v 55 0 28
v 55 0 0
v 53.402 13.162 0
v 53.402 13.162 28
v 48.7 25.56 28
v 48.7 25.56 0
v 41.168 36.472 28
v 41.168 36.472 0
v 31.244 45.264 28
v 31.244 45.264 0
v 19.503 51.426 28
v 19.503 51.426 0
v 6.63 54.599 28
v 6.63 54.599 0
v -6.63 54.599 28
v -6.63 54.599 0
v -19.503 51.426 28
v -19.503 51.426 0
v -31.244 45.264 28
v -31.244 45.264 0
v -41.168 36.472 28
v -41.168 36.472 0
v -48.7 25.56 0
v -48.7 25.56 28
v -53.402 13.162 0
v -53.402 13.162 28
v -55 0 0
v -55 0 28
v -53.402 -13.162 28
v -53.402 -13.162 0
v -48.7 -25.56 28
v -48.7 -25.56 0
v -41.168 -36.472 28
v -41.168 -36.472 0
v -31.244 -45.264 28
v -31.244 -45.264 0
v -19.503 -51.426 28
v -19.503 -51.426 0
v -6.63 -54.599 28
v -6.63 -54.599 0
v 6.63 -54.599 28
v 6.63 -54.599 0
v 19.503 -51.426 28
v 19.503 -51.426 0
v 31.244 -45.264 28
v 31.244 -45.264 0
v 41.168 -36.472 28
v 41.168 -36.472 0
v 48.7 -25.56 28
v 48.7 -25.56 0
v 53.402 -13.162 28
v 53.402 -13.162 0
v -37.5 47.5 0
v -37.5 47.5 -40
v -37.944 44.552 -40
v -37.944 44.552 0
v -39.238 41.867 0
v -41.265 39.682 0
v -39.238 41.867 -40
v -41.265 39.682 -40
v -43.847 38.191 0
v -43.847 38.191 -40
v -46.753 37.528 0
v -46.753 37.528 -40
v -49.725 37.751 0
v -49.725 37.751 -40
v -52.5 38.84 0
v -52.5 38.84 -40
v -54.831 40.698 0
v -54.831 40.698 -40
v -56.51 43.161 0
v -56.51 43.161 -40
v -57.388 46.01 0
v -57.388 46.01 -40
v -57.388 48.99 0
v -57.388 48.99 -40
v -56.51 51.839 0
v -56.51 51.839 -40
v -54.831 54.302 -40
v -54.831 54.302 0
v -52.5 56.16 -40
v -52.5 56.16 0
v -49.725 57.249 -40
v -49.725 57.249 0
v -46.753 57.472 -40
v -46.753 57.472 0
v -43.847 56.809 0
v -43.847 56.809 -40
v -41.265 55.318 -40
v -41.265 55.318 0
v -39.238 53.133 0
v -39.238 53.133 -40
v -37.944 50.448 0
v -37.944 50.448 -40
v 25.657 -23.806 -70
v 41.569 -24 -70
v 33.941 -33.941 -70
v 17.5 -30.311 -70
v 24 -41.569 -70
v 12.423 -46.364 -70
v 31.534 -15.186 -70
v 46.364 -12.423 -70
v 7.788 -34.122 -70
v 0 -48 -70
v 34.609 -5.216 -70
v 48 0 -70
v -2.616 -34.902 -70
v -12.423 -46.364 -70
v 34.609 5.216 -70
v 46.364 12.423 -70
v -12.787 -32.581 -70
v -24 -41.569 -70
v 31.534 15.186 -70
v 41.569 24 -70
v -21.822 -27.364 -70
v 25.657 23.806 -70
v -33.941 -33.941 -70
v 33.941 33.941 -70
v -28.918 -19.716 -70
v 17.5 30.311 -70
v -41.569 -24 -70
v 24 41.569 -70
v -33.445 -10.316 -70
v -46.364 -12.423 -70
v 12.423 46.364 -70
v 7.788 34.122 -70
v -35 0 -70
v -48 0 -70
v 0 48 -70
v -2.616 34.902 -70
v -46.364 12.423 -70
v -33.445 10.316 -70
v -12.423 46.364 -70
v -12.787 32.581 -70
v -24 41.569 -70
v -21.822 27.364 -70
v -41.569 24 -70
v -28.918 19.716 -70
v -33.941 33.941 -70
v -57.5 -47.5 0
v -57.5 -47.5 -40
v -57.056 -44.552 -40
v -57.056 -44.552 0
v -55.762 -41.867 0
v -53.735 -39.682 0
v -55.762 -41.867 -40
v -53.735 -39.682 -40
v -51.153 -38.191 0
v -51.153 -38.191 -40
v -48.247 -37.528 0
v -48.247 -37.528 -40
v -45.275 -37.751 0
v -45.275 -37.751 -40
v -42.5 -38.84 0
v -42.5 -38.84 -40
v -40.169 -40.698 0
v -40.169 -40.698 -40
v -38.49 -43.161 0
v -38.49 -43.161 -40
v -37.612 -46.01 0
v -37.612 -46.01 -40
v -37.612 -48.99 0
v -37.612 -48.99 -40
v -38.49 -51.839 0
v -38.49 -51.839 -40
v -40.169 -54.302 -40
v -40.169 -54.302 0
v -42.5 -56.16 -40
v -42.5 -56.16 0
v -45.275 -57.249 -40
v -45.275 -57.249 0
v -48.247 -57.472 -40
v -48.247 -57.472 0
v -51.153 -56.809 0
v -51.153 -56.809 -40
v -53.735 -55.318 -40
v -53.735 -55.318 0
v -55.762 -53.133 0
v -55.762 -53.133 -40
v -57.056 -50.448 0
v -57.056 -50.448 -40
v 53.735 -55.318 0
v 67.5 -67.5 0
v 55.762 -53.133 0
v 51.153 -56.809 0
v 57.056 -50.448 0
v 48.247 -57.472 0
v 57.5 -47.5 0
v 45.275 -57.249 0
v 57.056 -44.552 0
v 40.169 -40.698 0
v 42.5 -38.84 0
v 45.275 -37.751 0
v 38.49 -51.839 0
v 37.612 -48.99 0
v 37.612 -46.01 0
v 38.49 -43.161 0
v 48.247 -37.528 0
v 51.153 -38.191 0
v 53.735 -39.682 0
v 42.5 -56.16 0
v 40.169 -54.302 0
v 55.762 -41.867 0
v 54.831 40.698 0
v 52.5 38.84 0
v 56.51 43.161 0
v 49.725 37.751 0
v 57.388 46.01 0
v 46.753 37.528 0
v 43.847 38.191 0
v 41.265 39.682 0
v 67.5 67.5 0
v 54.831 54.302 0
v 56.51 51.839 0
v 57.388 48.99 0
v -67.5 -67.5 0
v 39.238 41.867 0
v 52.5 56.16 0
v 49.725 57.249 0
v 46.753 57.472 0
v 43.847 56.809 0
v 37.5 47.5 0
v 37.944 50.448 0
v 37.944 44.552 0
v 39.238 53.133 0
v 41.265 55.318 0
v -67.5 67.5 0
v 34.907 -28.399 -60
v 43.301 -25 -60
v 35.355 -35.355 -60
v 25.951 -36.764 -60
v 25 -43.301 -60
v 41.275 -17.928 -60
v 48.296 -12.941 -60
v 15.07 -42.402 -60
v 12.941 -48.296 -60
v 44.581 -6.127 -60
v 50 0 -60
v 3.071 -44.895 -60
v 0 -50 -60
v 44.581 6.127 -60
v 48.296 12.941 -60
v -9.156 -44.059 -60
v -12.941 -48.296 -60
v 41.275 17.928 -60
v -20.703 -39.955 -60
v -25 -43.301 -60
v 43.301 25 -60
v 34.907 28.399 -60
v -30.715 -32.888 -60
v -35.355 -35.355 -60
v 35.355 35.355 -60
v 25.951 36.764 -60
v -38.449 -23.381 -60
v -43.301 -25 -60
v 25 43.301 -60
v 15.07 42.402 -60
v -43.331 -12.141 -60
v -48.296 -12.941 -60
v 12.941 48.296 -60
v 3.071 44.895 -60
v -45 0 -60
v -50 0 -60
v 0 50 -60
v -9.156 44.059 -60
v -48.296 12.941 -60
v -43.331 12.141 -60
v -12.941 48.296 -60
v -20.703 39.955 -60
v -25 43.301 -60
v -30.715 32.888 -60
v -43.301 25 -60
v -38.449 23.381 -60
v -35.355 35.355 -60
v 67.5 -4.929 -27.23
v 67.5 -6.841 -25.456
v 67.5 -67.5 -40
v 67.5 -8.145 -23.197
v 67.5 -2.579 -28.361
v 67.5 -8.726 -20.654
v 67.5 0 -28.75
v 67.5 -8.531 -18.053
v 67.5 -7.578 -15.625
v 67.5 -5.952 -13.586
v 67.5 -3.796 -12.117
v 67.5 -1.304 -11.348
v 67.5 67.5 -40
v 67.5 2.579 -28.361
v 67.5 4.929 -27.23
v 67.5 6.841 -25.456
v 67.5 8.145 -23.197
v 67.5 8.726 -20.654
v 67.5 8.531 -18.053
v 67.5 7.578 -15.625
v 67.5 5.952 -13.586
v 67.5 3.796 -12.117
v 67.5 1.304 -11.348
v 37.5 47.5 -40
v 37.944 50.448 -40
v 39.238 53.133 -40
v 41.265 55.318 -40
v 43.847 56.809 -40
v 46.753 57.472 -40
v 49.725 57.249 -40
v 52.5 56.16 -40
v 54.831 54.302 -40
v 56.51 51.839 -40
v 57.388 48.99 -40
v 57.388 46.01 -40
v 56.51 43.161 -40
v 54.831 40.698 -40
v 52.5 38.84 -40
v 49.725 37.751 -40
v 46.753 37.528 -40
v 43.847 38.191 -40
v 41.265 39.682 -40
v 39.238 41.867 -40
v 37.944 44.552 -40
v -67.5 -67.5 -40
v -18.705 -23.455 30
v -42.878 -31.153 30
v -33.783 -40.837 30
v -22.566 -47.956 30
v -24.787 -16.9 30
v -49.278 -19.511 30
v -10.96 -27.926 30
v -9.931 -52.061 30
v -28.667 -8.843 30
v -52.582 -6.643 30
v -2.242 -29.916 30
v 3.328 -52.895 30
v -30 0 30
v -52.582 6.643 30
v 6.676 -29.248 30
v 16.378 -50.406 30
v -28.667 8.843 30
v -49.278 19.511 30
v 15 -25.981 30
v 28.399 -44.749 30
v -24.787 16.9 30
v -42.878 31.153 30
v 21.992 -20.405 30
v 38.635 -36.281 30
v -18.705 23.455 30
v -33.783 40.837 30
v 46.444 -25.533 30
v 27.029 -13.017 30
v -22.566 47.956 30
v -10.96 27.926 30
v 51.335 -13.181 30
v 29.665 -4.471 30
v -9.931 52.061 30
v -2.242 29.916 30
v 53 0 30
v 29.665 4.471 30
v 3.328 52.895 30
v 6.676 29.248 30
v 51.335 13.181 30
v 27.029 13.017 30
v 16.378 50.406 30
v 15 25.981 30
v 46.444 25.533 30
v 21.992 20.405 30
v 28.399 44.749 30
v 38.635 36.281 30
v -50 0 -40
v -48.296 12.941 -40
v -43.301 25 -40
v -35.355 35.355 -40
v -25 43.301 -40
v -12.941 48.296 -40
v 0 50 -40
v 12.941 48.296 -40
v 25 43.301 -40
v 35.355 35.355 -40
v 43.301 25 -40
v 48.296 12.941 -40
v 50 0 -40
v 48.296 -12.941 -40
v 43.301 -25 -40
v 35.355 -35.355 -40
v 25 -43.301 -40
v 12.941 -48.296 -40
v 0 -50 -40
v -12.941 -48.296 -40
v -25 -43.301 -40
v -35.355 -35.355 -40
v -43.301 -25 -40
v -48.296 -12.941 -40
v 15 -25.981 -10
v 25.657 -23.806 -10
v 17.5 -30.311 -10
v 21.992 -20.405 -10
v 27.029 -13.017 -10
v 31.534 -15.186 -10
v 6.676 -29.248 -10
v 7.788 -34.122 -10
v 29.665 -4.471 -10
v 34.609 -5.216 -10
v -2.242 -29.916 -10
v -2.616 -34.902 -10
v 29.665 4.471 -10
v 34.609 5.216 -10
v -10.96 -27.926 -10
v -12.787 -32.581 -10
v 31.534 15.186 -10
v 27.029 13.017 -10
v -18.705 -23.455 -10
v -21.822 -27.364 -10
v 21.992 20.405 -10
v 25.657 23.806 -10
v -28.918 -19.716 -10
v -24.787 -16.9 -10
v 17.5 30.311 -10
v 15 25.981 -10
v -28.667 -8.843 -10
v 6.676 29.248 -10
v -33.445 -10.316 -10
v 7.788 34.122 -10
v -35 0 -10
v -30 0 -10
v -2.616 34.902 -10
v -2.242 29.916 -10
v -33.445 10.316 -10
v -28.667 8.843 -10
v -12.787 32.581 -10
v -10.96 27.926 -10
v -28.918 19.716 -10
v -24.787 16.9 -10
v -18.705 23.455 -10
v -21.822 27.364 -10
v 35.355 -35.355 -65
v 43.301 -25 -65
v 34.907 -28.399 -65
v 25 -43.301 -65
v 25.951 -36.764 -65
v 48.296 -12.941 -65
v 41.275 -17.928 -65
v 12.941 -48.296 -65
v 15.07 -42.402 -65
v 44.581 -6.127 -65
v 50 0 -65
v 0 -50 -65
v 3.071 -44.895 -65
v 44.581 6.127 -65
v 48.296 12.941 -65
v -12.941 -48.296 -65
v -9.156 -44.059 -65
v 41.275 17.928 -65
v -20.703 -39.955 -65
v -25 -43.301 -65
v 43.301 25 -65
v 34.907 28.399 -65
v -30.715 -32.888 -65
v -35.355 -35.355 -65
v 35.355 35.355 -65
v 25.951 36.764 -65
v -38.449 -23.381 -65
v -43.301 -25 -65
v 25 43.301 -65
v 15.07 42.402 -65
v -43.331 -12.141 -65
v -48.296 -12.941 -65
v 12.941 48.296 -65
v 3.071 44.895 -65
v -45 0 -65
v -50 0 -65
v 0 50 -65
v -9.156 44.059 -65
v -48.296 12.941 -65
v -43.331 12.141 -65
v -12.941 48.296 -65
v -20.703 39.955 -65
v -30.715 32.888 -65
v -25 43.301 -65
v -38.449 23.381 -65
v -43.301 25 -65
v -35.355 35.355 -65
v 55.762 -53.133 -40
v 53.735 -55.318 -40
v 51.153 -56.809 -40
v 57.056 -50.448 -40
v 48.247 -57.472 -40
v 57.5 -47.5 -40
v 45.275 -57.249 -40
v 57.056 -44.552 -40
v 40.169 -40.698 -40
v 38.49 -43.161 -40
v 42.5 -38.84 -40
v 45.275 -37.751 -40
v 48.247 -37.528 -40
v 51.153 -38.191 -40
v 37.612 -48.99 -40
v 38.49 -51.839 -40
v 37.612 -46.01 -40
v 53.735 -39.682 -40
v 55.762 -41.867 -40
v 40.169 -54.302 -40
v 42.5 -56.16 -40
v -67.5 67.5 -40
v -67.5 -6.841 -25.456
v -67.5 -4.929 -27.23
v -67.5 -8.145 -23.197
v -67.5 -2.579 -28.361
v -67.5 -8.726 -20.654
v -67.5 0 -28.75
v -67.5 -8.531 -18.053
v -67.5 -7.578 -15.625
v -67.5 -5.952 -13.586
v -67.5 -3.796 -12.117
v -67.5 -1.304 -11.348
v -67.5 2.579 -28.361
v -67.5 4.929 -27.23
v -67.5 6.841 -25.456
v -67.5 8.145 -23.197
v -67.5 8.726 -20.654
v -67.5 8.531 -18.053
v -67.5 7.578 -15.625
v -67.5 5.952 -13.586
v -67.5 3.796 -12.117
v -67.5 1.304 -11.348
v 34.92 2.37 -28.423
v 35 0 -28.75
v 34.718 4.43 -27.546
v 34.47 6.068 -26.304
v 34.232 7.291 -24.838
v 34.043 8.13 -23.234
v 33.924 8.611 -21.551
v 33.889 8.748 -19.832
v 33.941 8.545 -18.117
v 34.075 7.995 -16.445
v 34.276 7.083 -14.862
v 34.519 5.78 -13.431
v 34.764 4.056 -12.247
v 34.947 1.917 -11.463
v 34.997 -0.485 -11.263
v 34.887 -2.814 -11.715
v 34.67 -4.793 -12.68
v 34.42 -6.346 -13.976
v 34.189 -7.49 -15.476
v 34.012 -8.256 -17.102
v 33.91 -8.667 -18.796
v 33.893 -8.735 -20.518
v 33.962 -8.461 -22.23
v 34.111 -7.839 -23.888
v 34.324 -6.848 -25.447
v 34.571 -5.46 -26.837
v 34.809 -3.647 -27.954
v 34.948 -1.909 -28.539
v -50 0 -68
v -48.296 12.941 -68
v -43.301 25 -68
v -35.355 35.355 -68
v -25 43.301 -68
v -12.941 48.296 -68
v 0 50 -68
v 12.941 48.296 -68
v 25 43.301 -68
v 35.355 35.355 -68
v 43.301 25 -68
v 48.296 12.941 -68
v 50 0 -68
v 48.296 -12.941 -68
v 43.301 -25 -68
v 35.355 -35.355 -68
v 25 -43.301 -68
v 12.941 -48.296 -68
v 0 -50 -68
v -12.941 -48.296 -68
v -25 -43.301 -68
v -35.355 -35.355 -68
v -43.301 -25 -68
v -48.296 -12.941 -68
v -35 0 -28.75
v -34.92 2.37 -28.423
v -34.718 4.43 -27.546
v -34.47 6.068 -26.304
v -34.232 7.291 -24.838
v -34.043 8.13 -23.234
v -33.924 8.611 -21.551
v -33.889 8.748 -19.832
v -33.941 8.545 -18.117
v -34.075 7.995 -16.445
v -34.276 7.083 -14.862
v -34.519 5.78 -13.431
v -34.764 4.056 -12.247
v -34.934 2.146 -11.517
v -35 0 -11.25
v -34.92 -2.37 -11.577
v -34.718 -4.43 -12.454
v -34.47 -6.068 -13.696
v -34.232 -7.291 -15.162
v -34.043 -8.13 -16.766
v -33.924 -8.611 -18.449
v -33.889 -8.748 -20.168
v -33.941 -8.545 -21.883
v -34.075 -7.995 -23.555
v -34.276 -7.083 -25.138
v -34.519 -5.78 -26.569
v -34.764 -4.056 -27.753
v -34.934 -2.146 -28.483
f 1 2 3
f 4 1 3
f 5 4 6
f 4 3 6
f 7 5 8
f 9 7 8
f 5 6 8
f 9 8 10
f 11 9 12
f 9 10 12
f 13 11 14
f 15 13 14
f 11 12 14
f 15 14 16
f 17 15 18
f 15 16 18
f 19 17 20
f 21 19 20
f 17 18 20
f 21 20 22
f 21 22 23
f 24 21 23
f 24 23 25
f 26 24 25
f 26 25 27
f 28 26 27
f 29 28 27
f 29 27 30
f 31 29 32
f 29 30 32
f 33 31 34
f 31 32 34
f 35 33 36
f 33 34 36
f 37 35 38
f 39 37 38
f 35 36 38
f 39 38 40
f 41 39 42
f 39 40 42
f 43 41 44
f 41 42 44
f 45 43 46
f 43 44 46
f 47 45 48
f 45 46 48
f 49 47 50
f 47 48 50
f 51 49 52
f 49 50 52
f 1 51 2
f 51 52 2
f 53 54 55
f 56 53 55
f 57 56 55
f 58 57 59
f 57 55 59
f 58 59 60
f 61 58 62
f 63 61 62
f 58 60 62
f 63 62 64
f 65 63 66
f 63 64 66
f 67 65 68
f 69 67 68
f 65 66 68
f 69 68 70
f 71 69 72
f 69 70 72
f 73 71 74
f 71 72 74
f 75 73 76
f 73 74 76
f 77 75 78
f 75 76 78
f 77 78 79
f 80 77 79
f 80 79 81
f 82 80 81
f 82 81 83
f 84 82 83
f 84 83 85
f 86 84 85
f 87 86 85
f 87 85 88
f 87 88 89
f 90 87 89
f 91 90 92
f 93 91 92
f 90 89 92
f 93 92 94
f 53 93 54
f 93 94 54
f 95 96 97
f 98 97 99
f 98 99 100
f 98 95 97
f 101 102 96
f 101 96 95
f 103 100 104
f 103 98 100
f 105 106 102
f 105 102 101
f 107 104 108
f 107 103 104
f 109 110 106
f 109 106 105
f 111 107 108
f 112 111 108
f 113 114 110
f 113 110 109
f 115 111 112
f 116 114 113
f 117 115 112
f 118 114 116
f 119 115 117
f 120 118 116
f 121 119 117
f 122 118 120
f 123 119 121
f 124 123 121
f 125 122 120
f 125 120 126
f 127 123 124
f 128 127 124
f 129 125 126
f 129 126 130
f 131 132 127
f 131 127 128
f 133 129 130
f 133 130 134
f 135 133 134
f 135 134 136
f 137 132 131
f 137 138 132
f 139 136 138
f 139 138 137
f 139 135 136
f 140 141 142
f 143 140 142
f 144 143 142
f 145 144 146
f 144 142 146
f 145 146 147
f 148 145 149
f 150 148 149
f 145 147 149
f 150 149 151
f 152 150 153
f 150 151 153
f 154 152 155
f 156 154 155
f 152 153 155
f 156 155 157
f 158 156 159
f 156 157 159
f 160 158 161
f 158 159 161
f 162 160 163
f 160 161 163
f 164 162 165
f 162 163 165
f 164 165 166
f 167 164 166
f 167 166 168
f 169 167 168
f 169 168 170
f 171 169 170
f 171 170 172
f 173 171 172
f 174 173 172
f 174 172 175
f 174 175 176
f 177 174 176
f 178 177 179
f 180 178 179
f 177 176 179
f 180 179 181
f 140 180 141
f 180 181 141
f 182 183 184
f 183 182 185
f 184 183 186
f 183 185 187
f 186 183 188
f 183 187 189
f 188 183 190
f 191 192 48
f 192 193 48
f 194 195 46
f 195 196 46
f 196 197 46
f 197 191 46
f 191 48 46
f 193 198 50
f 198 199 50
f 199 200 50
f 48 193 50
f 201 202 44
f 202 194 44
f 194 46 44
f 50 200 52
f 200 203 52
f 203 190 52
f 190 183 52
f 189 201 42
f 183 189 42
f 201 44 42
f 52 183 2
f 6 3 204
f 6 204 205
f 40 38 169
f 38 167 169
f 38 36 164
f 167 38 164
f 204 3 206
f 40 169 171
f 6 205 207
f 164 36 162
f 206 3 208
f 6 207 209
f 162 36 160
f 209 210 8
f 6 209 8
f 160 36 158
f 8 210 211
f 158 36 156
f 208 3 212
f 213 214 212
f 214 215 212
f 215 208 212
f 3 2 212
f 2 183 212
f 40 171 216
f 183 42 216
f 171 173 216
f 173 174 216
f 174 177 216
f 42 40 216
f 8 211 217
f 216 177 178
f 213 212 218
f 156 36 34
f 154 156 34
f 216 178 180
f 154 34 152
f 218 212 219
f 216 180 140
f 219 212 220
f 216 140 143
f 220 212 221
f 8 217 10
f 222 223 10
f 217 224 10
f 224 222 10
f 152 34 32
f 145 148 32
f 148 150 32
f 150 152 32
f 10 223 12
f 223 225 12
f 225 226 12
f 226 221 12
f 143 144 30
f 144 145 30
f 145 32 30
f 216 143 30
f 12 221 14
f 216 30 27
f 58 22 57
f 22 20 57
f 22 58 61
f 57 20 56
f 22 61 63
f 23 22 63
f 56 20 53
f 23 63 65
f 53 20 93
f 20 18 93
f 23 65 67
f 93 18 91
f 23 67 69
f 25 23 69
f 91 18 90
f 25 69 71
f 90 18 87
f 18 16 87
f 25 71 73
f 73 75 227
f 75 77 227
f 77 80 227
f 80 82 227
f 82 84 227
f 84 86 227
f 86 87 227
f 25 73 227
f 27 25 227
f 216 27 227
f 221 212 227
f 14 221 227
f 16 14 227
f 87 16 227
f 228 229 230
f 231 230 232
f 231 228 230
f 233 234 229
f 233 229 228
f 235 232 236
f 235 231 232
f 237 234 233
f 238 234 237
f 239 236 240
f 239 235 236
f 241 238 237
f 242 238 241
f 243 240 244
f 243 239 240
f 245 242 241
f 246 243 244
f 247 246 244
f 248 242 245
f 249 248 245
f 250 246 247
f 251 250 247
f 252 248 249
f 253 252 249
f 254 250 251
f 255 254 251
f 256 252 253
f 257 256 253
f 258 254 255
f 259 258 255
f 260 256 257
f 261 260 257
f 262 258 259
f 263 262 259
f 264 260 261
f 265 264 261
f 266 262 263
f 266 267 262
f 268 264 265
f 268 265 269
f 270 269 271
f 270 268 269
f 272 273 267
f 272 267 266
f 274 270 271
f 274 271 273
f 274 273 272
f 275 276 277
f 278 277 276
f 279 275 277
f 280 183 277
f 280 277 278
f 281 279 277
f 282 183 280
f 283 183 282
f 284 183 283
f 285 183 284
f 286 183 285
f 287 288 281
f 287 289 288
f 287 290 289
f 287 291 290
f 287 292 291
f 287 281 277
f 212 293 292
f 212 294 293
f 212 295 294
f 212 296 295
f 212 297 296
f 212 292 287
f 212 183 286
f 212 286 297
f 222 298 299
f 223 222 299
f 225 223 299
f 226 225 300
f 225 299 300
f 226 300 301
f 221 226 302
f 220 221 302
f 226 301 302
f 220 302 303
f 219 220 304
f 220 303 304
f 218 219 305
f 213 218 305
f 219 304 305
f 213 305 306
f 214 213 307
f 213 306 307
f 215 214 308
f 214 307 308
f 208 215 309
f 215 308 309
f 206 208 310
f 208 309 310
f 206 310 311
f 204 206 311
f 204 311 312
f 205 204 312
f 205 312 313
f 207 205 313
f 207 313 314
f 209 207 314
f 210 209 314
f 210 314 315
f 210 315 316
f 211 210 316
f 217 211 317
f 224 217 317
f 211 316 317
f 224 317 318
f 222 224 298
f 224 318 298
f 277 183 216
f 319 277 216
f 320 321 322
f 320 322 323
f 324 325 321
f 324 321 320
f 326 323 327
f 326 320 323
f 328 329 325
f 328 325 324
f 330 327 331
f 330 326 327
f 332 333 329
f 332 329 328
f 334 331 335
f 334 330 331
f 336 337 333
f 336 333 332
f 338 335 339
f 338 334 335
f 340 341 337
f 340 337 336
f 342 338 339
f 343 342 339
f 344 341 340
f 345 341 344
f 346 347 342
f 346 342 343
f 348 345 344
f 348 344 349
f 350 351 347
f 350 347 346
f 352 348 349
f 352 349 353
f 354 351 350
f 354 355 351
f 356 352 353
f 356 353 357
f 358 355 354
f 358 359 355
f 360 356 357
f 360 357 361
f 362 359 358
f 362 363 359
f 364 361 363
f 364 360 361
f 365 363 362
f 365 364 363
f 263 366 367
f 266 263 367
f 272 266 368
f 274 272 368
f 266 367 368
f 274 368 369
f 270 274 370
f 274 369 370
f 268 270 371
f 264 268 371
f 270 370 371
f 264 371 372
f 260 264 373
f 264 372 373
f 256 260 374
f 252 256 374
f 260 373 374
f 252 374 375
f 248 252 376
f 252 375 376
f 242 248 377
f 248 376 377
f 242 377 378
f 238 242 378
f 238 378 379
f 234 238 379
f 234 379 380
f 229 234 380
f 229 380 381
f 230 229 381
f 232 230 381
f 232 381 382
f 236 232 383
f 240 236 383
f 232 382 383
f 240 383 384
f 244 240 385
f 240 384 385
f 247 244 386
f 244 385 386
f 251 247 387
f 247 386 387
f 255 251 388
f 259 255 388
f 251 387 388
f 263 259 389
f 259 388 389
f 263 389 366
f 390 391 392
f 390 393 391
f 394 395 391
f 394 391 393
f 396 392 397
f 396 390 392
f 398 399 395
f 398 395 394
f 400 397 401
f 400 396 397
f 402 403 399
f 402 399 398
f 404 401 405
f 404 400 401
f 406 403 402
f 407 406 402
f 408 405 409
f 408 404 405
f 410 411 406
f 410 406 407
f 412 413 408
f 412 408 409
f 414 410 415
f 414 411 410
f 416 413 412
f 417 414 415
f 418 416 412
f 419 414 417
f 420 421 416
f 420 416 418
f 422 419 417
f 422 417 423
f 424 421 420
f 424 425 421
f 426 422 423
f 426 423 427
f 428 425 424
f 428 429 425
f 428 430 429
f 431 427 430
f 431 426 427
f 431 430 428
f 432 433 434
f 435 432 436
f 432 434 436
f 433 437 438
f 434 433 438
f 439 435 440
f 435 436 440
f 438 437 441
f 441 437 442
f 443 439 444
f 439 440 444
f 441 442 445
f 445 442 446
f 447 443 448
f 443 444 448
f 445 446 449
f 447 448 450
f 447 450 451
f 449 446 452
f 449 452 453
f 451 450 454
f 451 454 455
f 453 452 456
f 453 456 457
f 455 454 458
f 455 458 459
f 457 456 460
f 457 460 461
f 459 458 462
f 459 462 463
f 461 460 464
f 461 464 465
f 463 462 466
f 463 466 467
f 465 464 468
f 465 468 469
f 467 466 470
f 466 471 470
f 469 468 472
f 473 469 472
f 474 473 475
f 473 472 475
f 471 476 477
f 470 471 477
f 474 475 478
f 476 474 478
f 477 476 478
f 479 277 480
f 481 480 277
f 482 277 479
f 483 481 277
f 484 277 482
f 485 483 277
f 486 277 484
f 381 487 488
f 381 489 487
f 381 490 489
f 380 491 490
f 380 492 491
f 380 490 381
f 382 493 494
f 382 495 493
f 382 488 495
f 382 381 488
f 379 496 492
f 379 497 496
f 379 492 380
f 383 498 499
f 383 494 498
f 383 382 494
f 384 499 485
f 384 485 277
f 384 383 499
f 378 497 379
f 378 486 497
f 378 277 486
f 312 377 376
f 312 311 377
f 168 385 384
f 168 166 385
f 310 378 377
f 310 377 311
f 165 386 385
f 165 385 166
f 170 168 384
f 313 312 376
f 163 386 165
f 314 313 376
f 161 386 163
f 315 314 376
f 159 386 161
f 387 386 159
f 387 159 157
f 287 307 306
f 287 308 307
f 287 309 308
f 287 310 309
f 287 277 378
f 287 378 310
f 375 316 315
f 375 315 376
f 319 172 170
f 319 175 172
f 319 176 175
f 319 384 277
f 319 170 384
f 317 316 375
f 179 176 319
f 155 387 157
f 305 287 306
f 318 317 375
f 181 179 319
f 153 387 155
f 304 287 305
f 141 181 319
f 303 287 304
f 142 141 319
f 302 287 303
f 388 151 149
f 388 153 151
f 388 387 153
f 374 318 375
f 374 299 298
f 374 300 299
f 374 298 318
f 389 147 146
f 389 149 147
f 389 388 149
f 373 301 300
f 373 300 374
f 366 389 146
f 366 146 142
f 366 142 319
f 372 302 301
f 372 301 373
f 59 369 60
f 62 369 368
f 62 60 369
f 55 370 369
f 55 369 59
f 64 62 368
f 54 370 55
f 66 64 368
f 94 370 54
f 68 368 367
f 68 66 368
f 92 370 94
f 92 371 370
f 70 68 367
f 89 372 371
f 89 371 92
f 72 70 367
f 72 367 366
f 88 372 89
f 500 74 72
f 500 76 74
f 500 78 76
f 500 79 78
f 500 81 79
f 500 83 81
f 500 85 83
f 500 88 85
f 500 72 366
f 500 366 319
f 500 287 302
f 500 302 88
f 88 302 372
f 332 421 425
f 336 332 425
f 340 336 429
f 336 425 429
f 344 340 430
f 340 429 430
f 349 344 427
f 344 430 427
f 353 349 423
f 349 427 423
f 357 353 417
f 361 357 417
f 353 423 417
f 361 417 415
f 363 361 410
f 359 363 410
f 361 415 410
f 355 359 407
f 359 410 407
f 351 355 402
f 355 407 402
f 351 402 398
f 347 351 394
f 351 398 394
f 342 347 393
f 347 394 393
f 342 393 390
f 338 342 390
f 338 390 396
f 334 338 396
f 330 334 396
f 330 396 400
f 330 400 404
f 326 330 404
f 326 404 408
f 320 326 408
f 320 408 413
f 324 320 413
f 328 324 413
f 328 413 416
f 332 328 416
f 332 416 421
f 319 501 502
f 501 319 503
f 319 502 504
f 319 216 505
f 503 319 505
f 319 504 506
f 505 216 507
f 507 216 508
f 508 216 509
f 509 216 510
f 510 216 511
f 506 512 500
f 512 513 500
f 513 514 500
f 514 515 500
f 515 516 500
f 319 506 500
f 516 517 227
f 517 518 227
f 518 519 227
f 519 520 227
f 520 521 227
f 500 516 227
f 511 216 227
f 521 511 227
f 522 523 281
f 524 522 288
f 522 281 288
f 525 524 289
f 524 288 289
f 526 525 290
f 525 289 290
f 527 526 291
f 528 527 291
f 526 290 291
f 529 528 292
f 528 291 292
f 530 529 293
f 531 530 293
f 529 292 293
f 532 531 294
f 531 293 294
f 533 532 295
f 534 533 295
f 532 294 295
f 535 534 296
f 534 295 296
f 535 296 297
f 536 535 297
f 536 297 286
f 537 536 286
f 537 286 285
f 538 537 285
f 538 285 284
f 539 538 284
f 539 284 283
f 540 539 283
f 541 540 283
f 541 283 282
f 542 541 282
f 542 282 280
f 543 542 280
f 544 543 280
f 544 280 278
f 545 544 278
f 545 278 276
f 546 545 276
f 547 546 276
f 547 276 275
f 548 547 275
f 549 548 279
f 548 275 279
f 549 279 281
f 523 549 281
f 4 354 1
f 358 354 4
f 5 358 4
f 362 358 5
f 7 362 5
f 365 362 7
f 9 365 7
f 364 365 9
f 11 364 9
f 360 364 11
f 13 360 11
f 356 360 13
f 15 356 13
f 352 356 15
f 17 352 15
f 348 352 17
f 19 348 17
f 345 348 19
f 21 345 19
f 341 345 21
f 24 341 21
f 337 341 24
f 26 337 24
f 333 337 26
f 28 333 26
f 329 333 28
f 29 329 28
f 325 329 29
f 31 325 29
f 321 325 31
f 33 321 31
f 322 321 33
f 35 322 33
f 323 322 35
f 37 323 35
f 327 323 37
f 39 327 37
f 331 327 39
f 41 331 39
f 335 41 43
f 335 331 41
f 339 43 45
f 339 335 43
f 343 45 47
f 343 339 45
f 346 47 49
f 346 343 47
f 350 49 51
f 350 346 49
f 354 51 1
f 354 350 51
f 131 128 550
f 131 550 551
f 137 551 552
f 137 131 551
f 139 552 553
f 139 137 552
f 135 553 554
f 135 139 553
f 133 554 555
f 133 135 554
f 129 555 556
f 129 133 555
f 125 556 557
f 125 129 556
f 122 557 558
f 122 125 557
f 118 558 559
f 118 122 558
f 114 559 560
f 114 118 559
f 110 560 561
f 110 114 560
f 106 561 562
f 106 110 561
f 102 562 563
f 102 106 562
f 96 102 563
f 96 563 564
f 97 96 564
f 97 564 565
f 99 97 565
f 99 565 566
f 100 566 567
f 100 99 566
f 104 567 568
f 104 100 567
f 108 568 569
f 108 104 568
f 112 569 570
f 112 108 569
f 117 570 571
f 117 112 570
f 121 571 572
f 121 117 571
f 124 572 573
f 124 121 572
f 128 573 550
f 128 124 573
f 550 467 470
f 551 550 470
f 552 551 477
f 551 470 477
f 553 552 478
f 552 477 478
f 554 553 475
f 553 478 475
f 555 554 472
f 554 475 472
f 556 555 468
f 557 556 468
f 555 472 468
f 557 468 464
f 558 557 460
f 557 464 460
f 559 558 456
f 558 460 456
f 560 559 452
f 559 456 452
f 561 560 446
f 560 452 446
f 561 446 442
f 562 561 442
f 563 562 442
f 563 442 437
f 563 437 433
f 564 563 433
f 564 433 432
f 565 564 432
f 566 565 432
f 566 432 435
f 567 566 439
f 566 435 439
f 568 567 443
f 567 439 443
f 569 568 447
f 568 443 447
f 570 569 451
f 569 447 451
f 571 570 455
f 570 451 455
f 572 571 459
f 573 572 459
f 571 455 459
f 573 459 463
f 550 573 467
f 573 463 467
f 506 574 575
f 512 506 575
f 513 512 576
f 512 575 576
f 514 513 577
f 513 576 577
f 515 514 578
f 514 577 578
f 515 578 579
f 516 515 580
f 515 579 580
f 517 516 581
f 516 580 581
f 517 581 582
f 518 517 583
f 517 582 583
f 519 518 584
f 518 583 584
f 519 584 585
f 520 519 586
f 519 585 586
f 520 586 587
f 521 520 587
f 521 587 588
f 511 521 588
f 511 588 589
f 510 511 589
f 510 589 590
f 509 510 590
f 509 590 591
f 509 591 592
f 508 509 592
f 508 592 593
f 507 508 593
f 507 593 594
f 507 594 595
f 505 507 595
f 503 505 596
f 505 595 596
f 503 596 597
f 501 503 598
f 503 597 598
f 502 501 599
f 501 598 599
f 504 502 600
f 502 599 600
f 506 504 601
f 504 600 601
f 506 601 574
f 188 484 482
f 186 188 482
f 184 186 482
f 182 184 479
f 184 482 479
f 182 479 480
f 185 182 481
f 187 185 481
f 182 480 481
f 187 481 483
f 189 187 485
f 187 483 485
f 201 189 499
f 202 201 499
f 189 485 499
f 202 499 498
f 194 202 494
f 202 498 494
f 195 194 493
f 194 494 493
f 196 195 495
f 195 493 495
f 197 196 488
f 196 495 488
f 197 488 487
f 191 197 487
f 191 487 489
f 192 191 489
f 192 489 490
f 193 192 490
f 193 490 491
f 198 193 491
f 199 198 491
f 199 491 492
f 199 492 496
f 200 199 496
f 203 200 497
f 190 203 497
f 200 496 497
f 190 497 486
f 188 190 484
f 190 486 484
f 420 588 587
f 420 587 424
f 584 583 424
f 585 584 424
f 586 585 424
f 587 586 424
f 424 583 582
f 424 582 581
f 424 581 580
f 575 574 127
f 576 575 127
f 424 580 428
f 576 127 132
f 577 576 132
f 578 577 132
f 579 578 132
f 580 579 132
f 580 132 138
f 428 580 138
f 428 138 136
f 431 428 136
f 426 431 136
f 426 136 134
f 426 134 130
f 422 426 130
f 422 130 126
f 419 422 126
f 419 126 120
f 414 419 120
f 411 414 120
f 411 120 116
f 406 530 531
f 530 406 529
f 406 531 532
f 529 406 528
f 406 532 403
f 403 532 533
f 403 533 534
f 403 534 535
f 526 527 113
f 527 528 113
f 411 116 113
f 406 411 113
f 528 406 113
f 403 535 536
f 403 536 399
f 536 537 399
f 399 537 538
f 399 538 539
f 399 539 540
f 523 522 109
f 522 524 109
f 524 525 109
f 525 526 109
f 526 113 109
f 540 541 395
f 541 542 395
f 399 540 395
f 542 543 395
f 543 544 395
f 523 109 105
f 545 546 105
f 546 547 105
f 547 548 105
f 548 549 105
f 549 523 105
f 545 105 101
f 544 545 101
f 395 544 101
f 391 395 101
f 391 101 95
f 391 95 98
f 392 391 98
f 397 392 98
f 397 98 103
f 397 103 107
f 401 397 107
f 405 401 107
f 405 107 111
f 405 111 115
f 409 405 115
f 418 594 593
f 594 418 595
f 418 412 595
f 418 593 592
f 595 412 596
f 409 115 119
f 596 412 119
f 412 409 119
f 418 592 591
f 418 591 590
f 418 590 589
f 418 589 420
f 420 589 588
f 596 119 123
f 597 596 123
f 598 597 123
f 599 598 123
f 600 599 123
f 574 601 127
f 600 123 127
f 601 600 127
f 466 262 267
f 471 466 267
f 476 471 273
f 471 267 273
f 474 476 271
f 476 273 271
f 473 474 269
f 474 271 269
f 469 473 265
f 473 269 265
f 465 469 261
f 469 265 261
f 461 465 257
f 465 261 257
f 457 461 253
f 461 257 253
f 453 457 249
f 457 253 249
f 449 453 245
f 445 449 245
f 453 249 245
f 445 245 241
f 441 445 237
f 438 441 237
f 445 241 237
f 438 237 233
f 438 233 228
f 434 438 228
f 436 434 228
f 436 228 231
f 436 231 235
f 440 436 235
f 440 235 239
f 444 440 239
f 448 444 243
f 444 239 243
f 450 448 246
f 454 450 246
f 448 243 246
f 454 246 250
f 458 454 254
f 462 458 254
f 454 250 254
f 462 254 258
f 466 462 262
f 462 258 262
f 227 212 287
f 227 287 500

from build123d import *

# Parameters (mm, degrees)
SKETCH1_R              = 55
BOSS_EXTRUDE1_DEPTH    = 30
SKETCH2_W              = 135
SKETCH2_H              = 135
BOSS_EXTRUDE2_DEPTH    = 40
SKETCH3_R              = 10
CUT_EXTRUDE1_DEPTH     = 40
SKETCH4_R              = 50
BOSS_EXTRUDE3_DEPTH    = 20
SKETCH5_R              = 45
BOSS_EXTRUDE4_DEPTH    = 5
SKETCH6_R              = 50
BOSS_EXTRUDE5_DEPTH    = 5
CHAMFER1_SIZE          = 2
CHAMFER2_SIZE          = 2
M20X2_5_TAPPED_HOLE1_D = 17.5
SKETCH9_R              = 35
CUT_EXTRUDE2_DEPTH     = 60
SKETCH10_R             = 30
CUT_EXTRUDE3_DEPTH     = 113.749722951


with BuildPart() as part:
    # Sketch1 → Boss-Extrude1 (new body)
    with BuildSketch(Plane.XY):
        Circle(SKETCH1_R)
    extrude(amount=BOSS_EXTRUDE1_DEPTH)

    # Sketch2 → Boss-Extrude2 (add)
    with BuildSketch(Plane(origin=(0, 0, 0), x_dir=(-1, 0, 0), z_dir=(0, 0, -1))):
        Rectangle(SKETCH2_W, SKETCH2_H)
    extrude(amount=BOSS_EXTRUDE2_DEPTH)

    # Sketch3 → Cut-Extrude1 (cut)
    with BuildSketch(Plane(origin=(0, 0, -40), x_dir=(-1, 0, 0), z_dir=(0, 0, -1))):
        with Locations((-47.5, 47.5)):
            Circle(SKETCH3_R)
        with Locations(Location((47.5, 47.5, 0), (0, 0, 180))):
            Circle(SKETCH3_R)
        with Locations((47.5, -47.5)):
            Circle(SKETCH3_R)
        with Locations(Location((-47.5, -47.5, 0), (0, 0, 180))):
            Circle(SKETCH3_R)
    extrude(amount=-CUT_EXTRUDE1_DEPTH, mode=Mode.SUBTRACT)

    # Sketch4 → Boss-Extrude3 (add)
    with BuildSketch(Plane(origin=(0, 0, -40), x_dir=(-1, 0, 0), z_dir=(0, 0, -1))):
        Circle(SKETCH4_R)
    extrude(amount=BOSS_EXTRUDE3_DEPTH)

    # Sketch5 → Boss-Extrude4 (add)
    with BuildSketch(Plane(origin=(0, 0, -60), x_dir=(-1, 0, 0), z_dir=(0, 0, -1))):
        Circle(SKETCH5_R)
    extrude(amount=BOSS_EXTRUDE4_DEPTH)

    # Sketch6 → Boss-Extrude5 (add)
    with BuildSketch(Plane(origin=(0, 0, -65), x_dir=(-1, 0, 0), z_dir=(0, 0, -1))):
        Circle(SKETCH6_R)
    extrude(amount=BOSS_EXTRUDE5_DEPTH)

    # Chamfer1
    chamfer1_edges = [part.edges().sort_by_distance(p)[0] for p in [
        (-55, 0, 30),
    ]]
    chamfer(chamfer1_edges, length=CHAMFER1_SIZE)

    # Chamfer2
    chamfer2_edges = [part.edges().sort_by_distance(p)[0] for p in [
        (50, 0, -70),
    ]]
    chamfer(chamfer2_edges, length=CHAMFER2_SIZE)

    # M20x2.5 Tapped Hole1 (through all)
    with Locations(Plane.ZY.offset(67.5)):
        with Locations((-20, 0)):
            Hole(M20X2_5_TAPPED_HOLE1_D / 2)

    # Sketch9 → Cut-Extrude2 (cut)
    with BuildSketch(Plane(origin=(0, 0, -70), x_dir=(-1, 0, 0), z_dir=(0, 0, -1))):
        Circle(SKETCH9_R)
    extrude(amount=-CUT_EXTRUDE2_DEPTH, mode=Mode.SUBTRACT)

    # Sketch10 → Cut-Extrude3 (cut, through all)
    with BuildSketch(Plane(origin=(0, 0, -10), x_dir=(-1, 0, 0), z_dir=(0, 0, -1))):
        Circle(SKETCH10_R)
    extrude(amount=-CUT_EXTRUDE3_DEPTH, mode=Mode.SUBTRACT)


solid = part.part
